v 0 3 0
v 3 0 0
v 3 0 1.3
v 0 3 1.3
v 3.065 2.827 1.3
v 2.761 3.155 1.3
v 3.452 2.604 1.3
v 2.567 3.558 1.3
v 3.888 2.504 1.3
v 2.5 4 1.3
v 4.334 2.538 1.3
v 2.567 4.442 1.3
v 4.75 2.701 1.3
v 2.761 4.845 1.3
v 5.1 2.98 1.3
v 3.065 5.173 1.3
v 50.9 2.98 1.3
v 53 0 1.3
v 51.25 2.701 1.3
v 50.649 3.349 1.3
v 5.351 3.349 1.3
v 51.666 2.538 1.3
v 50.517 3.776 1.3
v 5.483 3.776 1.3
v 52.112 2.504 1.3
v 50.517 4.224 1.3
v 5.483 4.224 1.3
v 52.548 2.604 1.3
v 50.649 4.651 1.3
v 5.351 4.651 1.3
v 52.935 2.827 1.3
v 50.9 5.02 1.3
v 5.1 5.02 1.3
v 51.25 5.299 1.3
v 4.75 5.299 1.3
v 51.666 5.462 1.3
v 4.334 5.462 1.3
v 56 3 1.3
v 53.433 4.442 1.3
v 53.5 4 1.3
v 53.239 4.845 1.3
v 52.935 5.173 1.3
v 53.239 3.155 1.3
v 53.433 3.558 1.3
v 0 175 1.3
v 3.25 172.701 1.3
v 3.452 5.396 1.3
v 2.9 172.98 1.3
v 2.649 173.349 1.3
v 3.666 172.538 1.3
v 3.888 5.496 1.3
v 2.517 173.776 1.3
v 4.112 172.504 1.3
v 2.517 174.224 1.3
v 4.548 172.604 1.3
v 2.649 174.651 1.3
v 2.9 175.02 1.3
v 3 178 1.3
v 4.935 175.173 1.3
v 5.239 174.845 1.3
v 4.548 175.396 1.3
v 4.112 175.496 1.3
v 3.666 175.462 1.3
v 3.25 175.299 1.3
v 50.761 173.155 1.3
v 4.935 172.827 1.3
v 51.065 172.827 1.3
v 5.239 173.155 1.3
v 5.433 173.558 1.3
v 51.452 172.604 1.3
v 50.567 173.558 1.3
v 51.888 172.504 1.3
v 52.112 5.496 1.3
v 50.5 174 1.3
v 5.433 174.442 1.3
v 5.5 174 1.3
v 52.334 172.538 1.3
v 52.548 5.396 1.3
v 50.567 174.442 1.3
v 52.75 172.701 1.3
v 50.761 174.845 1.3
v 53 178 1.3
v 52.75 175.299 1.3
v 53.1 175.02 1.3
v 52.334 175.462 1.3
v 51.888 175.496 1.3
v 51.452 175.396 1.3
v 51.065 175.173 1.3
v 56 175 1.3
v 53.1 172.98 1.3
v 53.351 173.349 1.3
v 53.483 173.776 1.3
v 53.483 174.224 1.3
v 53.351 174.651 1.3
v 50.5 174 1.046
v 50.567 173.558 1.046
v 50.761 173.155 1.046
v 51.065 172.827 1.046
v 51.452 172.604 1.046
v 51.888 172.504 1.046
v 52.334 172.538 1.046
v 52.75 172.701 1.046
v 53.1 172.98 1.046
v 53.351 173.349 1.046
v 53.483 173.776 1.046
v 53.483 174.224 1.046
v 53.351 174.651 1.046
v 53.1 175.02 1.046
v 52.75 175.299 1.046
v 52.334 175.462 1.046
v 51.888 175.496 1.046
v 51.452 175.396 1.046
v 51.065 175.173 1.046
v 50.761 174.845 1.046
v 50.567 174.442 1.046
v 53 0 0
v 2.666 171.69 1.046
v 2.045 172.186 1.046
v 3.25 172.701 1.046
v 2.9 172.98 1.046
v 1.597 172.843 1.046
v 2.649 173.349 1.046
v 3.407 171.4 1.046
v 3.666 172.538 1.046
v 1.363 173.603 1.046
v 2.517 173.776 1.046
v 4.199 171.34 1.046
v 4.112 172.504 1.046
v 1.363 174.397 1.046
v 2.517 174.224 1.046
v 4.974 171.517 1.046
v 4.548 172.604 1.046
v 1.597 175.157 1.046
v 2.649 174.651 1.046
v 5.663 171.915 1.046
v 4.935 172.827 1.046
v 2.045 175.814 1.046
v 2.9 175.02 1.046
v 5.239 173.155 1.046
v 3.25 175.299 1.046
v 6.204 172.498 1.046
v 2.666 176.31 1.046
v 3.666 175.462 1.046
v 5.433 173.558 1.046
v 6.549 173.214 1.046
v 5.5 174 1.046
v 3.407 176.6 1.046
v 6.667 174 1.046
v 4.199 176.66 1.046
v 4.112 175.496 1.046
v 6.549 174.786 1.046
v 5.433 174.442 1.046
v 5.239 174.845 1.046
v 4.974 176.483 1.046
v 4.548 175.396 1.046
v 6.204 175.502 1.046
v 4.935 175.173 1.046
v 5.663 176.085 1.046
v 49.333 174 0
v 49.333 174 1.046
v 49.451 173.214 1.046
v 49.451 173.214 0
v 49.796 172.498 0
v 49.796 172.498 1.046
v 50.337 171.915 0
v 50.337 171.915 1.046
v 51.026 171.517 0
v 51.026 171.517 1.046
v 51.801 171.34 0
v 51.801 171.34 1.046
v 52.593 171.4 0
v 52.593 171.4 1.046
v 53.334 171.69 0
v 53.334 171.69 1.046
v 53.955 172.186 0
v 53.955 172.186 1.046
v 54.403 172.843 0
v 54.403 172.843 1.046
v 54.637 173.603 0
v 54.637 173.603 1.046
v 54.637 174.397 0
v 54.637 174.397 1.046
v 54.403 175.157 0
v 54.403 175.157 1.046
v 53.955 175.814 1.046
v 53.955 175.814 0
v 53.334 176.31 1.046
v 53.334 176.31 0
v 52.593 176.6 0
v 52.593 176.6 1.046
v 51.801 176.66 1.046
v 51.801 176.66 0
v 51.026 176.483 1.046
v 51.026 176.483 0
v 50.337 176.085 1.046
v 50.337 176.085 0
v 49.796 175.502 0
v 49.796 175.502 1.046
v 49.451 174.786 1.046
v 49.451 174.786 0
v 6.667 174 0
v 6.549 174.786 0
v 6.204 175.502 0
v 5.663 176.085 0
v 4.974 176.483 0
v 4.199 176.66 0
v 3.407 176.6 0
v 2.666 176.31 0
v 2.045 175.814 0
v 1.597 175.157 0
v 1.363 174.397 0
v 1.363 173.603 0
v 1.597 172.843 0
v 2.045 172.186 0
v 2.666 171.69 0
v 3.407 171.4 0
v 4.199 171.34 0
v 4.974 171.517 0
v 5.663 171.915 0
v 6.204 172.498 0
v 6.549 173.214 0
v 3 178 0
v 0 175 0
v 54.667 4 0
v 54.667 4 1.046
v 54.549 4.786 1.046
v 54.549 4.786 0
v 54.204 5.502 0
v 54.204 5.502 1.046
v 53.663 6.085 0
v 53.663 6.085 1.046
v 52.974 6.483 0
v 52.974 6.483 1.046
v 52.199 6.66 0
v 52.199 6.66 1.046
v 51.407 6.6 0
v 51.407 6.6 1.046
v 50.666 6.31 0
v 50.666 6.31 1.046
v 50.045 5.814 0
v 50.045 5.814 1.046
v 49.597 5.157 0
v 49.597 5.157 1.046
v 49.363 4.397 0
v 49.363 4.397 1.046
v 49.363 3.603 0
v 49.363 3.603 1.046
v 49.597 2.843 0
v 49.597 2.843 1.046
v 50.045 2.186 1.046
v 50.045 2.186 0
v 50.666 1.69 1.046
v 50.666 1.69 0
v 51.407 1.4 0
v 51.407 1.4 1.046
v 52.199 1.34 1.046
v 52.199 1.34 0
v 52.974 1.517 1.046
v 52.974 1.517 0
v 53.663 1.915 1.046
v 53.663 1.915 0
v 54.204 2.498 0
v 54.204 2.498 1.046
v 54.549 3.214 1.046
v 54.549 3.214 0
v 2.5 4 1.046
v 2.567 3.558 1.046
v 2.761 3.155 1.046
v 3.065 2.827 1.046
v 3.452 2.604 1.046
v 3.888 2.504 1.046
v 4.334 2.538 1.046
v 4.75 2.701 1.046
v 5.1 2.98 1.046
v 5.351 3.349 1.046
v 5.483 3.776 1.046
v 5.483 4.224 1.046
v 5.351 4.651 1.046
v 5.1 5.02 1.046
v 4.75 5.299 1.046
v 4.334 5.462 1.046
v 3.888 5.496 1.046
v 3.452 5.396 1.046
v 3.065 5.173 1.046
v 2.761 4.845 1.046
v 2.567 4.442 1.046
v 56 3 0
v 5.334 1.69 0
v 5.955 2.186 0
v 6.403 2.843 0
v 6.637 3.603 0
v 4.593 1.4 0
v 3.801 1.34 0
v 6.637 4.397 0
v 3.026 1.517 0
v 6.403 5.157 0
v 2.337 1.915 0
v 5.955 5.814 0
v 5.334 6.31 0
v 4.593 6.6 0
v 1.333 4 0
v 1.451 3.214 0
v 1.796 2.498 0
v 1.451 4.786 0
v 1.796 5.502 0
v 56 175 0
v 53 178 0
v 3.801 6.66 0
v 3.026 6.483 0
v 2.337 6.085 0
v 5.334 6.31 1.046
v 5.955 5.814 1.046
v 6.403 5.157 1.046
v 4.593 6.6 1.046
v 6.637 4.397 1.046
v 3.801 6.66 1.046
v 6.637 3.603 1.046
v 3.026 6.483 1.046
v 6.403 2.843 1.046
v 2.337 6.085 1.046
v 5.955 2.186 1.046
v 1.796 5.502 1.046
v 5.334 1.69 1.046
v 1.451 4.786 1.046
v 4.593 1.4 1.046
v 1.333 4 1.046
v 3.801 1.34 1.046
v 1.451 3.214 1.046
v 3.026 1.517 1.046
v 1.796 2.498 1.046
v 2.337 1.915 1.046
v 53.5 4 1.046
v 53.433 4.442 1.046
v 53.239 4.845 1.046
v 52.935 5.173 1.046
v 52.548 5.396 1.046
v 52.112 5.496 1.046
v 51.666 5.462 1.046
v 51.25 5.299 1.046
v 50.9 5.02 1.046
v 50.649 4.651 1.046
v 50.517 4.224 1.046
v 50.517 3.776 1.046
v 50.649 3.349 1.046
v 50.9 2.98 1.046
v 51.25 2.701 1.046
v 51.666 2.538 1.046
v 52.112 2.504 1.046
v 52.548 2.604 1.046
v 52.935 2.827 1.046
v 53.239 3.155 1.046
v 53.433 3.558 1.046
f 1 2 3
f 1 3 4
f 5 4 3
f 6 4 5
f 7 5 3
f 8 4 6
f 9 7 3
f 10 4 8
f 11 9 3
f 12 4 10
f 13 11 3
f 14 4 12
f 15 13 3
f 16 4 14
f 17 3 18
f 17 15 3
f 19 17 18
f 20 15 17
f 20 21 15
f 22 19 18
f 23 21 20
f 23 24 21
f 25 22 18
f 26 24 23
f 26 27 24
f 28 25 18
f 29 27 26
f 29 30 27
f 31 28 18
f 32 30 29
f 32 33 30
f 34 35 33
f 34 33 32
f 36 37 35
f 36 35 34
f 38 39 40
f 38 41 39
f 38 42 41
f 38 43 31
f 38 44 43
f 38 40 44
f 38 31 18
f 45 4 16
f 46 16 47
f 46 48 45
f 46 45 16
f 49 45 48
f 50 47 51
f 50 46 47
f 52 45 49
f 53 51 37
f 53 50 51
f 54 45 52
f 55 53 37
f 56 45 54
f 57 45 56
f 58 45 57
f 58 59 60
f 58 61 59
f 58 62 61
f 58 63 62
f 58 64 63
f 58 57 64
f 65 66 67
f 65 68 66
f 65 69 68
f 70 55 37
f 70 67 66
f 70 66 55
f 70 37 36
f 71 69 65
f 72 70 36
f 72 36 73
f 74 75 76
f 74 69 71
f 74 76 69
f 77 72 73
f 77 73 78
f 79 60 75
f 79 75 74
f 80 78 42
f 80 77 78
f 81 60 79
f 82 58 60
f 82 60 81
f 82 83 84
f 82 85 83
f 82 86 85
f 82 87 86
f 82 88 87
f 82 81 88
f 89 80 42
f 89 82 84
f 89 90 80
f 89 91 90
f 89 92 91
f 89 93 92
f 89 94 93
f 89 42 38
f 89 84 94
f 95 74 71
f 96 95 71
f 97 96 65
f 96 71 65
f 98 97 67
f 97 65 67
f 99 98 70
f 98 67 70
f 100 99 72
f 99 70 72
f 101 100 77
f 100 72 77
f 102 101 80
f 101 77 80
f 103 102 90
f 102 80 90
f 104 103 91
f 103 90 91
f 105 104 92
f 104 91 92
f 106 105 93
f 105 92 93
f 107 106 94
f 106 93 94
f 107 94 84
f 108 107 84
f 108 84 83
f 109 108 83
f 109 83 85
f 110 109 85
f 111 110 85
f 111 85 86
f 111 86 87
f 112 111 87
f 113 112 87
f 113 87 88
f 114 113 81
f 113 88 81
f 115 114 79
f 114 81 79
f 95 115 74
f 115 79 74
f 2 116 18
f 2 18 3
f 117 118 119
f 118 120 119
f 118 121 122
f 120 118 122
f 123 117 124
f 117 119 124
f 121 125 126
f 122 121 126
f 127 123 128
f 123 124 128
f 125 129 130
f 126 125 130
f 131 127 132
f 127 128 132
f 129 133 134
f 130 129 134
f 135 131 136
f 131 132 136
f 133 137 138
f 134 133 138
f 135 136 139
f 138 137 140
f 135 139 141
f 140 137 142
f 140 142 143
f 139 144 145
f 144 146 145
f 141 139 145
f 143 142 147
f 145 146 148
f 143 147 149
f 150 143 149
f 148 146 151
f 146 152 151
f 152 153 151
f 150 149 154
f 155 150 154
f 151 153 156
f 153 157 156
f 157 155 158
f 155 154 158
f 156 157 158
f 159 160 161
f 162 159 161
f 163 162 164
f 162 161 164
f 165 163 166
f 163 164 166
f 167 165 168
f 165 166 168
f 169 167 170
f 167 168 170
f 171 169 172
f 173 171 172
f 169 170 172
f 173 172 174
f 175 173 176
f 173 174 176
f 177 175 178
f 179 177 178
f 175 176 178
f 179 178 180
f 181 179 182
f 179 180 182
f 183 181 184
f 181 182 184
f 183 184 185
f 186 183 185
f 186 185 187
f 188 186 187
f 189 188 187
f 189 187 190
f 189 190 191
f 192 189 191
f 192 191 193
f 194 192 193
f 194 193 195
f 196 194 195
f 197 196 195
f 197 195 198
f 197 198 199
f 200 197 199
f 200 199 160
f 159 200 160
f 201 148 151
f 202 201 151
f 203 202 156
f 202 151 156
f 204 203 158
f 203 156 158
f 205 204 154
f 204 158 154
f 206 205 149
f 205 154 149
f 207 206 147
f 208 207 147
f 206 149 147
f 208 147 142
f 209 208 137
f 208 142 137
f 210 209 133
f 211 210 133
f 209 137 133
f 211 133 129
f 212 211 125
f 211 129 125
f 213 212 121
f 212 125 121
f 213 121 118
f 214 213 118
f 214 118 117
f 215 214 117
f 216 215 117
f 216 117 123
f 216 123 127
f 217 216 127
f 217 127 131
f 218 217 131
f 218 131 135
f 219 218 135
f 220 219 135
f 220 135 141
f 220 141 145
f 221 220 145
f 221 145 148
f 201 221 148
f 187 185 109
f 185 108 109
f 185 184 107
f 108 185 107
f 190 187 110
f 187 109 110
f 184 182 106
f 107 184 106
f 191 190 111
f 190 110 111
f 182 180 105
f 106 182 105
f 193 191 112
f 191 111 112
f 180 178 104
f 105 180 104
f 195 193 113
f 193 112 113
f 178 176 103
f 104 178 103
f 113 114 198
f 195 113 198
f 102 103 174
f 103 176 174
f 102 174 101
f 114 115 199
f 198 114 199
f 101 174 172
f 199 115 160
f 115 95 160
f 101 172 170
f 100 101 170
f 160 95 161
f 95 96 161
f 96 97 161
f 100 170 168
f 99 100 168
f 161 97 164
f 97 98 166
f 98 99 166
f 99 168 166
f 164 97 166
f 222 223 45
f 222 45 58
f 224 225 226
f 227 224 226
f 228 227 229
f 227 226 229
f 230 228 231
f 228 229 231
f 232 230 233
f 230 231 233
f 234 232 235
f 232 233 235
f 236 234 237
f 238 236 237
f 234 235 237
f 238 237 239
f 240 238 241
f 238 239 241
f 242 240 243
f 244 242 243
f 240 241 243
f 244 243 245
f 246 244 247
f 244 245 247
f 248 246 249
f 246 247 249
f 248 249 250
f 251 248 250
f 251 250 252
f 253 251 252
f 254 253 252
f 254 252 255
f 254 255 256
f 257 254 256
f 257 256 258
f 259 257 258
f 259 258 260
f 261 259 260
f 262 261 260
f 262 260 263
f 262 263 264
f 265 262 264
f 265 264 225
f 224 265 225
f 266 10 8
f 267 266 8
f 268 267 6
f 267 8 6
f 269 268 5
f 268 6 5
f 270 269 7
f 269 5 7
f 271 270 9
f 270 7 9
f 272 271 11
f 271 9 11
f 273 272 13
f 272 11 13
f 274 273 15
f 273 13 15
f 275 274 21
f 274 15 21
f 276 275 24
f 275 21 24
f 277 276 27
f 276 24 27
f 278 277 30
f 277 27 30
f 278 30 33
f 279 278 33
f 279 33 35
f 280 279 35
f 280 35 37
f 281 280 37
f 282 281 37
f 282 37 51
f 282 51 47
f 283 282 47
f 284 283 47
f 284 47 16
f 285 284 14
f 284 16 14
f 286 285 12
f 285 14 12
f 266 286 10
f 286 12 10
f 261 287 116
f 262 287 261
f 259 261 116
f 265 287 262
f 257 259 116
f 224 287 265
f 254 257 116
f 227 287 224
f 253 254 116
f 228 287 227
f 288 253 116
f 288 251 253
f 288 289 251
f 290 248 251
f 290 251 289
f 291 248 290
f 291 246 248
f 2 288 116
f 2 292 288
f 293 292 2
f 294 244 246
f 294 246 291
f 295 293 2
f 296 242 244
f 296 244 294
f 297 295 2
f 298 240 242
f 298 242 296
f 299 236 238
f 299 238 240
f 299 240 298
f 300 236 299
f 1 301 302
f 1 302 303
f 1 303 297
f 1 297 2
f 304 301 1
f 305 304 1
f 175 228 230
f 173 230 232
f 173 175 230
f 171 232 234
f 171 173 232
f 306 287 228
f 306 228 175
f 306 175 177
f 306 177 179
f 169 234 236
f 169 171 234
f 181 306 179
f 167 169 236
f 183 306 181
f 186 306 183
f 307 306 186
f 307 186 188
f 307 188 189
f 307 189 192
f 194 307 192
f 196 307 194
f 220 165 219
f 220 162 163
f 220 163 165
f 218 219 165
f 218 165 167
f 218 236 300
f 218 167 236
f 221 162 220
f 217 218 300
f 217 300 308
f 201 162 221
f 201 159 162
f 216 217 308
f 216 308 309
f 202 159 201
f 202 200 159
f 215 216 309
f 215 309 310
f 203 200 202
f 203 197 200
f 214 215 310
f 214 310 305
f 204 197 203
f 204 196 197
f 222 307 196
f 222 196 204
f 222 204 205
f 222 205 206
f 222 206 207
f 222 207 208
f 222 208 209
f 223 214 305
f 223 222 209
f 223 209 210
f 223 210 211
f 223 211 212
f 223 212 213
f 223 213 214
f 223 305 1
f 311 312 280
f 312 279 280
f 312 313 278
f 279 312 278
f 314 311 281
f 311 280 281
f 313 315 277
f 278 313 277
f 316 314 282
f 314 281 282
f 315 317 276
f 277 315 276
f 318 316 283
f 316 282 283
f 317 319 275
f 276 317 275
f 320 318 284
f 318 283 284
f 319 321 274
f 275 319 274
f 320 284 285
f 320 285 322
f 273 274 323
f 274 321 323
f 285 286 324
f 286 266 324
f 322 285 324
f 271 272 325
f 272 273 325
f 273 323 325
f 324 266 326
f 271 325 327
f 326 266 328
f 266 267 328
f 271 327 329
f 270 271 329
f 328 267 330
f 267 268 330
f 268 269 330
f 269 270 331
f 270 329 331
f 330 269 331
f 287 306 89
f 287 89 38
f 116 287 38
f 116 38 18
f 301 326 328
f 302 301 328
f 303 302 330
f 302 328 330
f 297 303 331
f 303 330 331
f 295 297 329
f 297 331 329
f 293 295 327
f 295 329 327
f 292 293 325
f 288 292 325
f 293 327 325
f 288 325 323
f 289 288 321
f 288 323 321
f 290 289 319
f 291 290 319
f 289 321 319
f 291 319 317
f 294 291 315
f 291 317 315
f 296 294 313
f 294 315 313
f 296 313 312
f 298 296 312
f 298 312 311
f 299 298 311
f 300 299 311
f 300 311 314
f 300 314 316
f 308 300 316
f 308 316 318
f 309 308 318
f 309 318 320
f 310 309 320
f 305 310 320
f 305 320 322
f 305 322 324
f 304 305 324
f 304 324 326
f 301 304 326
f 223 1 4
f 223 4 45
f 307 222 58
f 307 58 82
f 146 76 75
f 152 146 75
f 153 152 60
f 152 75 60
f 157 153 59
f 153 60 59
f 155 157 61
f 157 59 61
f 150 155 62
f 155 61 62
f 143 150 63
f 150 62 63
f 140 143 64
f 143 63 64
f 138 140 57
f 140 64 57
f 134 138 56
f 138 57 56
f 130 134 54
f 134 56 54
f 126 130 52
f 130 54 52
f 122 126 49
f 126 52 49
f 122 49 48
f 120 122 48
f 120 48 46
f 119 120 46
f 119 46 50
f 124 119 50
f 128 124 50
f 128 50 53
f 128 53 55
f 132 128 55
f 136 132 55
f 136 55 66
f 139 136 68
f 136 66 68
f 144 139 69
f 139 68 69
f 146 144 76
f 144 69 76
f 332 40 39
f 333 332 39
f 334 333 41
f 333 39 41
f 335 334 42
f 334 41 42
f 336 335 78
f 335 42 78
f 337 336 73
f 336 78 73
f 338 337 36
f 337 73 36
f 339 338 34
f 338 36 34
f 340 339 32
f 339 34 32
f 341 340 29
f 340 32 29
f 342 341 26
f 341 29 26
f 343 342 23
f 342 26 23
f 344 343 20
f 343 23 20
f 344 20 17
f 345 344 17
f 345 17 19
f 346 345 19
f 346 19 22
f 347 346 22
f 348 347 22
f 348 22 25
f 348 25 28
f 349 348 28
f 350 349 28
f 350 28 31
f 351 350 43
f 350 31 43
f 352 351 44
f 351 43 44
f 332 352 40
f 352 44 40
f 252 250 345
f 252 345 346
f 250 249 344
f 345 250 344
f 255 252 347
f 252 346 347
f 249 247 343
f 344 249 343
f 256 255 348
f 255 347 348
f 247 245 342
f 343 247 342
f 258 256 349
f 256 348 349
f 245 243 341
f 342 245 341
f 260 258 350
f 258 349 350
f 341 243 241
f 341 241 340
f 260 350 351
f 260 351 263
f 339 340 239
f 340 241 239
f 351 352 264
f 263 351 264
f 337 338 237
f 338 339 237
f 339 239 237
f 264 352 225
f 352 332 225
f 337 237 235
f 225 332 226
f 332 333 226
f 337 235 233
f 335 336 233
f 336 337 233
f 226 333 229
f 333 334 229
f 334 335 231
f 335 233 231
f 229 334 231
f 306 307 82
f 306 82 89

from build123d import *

# Parameters (mm, degrees)
BOSS_EXTRUDE1_DEPTH = 1.3
SKETCH4_R           = 2.667
CUT_EXTRUDE1_DEPTH  = 2
SKETCH5_R           = 2.667
SKETCH5_R_2         = 1.5
BOSS_EXTRUDE2_DEPTH = 0.254


with BuildPart() as part:
    # Sketch2 → Boss-Extrude1 (new body)
    with BuildSketch(Plane.XY):
        Polygon((0, 175), (3, 178), (53, 178), (56, 175), (56, 3), (53, 0), (3, 0), (0, 3), align=None)
    extrude(amount=BOSS_EXTRUDE1_DEPTH)

    # Sketch4 → Cut-Extrude1 (cut)
    with BuildSketch(Plane.XY.offset(1.3)):
        with Locations((4, 174)):
            Circle(SKETCH4_R)
        with Locations(Location((52, 174, 0), (0, 0, 180))):
            Circle(SKETCH4_R)
        with Locations((52, 4)):
            Circle(SKETCH4_R)
        with Locations(Location((4, 4, 0), (0, 0, 180))):
            Circle(SKETCH4_R)
    extrude(amount=-CUT_EXTRUDE1_DEPTH, mode=Mode.SUBTRACT)

    # Sketch5 → Boss-Extrude2 (add)
    # profile 1 of 4: a face of its own
    with BuildSketch(Plane.XY.offset(1.3)):
        with Locations((4, 174)):
            Circle(SKETCH5_R)
        with Locations((4, 174)):
            Circle(SKETCH5_R_2, mode=Mode.SUBTRACT)
    # profile 2 of 4: a face of its own
    with BuildSketch(Plane.XY.offset(1.3)):
        with Locations(Location((52, 174, 0), (0, 0, 180))):
            Circle(SKETCH5_R)
        with Locations(Location((52, 174, 0), (0, 0, 180))):
            Circle(SKETCH5_R_2, mode=Mode.SUBTRACT)
    # profile 3 of 4: a face of its own
    with BuildSketch(Plane.XY.offset(1.3)):
        with Locations((52, 4)):
            Circle(SKETCH5_R)
        with Locations((52, 4)):
            Circle(SKETCH5_R_2, mode=Mode.SUBTRACT)
    # profile 4 of 4: a face of its own
    with BuildSketch(Plane.XY.offset(1.3)):
        with Locations(Location((4, 4, 0), (0, 0, 180))):
            Circle(SKETCH5_R)
        with Locations(Location((4, 4, 0), (0, 0, 180))):
            Circle(SKETCH5_R_2, mode=Mode.SUBTRACT)
    extrude(amount=-BOSS_EXTRUDE2_DEPTH)


solid = part.part
